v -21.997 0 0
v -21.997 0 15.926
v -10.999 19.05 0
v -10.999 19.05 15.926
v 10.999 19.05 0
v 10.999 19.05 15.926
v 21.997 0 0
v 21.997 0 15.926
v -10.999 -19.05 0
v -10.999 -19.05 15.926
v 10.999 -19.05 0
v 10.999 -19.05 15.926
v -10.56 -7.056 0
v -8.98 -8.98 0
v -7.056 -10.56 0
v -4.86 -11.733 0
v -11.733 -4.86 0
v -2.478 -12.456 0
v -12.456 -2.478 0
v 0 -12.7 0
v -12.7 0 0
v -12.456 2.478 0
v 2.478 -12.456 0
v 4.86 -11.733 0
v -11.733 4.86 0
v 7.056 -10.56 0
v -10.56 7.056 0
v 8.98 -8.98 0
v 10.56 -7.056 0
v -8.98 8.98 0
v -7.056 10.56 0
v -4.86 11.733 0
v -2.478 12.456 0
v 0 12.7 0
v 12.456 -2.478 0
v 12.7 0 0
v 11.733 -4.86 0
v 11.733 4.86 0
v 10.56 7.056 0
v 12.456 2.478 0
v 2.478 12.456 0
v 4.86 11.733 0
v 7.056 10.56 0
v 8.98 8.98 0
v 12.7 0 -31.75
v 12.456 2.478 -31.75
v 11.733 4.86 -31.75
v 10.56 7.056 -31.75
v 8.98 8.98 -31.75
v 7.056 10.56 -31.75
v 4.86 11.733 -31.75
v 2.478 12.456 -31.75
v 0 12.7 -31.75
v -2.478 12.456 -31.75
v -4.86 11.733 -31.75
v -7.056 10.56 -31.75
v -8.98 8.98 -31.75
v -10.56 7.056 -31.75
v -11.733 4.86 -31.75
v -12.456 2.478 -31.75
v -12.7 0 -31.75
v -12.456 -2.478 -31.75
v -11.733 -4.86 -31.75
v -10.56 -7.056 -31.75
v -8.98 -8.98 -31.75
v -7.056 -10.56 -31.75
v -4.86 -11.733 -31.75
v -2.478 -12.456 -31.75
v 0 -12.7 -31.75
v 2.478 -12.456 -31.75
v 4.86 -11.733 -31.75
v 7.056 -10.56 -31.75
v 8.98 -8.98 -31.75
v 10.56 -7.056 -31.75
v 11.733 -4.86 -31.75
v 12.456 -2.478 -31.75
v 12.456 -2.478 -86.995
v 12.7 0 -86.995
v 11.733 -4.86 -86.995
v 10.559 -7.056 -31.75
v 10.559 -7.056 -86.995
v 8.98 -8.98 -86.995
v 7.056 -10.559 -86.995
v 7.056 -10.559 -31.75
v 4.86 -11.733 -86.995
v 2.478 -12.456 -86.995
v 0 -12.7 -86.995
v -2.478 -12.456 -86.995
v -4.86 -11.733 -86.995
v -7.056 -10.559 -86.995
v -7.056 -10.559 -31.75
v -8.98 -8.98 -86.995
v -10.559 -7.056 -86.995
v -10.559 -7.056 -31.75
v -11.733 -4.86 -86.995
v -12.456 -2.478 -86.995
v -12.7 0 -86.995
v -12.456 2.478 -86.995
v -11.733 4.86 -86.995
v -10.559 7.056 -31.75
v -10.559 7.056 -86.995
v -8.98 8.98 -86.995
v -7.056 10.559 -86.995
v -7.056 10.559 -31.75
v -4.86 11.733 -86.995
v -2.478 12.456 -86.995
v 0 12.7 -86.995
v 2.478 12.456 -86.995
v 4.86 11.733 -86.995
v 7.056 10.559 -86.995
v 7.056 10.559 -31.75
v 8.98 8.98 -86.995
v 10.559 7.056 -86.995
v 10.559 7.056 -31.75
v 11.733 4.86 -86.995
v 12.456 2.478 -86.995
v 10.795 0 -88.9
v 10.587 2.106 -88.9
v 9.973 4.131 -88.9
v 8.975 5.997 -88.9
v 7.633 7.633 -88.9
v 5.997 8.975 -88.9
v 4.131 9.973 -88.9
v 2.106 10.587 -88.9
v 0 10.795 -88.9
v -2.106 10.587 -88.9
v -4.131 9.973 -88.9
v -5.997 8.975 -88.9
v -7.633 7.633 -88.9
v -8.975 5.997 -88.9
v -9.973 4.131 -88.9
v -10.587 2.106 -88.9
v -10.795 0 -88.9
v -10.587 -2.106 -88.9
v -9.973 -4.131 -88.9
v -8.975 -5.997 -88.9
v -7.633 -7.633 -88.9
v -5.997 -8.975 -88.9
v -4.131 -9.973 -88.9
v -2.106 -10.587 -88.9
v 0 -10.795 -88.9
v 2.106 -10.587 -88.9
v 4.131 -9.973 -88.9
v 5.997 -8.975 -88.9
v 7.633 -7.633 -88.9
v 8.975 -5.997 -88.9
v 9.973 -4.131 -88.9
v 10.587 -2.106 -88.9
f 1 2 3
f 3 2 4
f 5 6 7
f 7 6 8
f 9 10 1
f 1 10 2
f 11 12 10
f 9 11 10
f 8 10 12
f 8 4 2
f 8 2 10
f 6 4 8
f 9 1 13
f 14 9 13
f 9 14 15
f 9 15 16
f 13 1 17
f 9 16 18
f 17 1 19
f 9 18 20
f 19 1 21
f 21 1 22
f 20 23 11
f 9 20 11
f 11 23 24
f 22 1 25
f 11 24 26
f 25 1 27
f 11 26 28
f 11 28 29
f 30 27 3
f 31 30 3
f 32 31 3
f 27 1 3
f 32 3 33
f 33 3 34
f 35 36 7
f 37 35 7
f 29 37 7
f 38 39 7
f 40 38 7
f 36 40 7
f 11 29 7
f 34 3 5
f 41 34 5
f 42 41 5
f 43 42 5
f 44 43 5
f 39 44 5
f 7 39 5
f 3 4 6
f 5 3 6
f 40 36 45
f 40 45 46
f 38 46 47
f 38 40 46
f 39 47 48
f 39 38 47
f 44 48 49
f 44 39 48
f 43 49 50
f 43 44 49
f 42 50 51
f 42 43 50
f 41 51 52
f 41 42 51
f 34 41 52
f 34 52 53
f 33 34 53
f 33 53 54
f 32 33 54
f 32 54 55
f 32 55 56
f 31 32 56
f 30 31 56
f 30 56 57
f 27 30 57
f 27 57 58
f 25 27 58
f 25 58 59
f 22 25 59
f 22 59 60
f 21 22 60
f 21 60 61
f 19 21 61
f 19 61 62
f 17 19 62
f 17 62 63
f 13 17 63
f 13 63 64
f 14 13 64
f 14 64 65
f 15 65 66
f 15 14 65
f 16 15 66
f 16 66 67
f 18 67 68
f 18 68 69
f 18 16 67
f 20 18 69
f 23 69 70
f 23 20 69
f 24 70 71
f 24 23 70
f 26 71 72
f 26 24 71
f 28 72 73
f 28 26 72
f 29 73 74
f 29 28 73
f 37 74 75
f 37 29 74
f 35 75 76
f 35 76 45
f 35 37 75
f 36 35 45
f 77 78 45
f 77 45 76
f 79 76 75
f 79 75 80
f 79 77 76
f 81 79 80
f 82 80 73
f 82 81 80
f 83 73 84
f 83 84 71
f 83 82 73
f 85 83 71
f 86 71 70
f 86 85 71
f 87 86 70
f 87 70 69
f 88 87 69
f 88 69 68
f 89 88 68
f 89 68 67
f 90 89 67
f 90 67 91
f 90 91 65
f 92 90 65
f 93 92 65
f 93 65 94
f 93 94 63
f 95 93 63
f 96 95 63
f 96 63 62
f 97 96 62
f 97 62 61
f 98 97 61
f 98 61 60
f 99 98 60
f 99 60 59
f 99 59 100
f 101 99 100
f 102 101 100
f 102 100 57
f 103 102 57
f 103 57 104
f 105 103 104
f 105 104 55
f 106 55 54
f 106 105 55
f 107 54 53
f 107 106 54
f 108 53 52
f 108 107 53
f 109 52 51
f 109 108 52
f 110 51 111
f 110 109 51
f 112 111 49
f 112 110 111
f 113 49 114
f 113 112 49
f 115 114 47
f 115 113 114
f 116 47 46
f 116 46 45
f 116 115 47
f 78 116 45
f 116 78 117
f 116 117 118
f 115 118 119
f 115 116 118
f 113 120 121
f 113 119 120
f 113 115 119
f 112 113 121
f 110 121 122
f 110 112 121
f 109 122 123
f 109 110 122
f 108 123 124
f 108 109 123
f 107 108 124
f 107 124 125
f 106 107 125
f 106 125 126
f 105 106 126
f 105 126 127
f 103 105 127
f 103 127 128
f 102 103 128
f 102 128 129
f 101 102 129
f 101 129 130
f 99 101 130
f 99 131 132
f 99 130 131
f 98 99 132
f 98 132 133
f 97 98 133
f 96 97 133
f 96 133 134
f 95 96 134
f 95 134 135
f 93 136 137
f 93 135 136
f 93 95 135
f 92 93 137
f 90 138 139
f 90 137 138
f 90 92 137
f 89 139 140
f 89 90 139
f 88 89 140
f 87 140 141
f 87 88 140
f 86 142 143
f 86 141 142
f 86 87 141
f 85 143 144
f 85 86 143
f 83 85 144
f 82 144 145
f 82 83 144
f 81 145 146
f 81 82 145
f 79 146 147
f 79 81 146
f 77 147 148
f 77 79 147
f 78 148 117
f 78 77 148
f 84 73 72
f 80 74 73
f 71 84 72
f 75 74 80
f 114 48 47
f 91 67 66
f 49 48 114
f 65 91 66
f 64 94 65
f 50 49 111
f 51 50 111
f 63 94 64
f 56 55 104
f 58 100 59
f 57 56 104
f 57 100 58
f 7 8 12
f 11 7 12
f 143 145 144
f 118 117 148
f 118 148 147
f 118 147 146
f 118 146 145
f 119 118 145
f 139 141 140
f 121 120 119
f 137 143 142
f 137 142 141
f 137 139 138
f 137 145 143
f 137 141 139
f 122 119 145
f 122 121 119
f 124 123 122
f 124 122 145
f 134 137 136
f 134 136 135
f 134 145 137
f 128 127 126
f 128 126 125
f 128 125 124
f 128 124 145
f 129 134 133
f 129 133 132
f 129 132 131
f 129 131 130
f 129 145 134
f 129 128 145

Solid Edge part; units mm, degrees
sketch "Sketch1" plane through (0, 0, 0) normal (0, 0, 1) x (1, 0, 0)
  circle A0 centre (0, 0) radius 22.098
  dimension "D1" = 44.196
extrude "Protrusion1" add sketch "Sketch1" along normal blind 15.9258
sketch "Sketch2" plane through (0, 0, 0) normal (0, 0, -1) x (1, 0, 0)
  circle A0 centre (0, 0) radius 12.7
extrude "Protrusion2" add sketch "Sketch2" along normal blind 88.9
sketch "Sketch3" plane through (0, 0, -88.9) normal (0, 0, -1) x (1, 0, 0)
  circle A0 centre (0, 0) radius 12.6997
extrude "Cutout1" cut sketch "Sketch3" against normal blind 57.15 flip side to cut
chamfer "Chamfer_1" distance 1.905 angle 45 1 edges at (-12.6997, 0, -88.9)
sketch "Sketch4" plane through (0, 0, 15.9258) normal (0, 0, 1) x (1, 0, 0)
  line L0 (-11.1991, 19.05) -> (11.1991, 19.05)
  dimension "D1" = 38.1
extrude "Cutout2" cut sketch "Sketch4" against normal up to next material side at (0, 19.1, 15.9258)
pattern_circular "Pattern1" count 6 over 360 about axis through (0, 0, 15.9258) along (0, 0, 1) of "Cutout2"
properties part number "24107015"
